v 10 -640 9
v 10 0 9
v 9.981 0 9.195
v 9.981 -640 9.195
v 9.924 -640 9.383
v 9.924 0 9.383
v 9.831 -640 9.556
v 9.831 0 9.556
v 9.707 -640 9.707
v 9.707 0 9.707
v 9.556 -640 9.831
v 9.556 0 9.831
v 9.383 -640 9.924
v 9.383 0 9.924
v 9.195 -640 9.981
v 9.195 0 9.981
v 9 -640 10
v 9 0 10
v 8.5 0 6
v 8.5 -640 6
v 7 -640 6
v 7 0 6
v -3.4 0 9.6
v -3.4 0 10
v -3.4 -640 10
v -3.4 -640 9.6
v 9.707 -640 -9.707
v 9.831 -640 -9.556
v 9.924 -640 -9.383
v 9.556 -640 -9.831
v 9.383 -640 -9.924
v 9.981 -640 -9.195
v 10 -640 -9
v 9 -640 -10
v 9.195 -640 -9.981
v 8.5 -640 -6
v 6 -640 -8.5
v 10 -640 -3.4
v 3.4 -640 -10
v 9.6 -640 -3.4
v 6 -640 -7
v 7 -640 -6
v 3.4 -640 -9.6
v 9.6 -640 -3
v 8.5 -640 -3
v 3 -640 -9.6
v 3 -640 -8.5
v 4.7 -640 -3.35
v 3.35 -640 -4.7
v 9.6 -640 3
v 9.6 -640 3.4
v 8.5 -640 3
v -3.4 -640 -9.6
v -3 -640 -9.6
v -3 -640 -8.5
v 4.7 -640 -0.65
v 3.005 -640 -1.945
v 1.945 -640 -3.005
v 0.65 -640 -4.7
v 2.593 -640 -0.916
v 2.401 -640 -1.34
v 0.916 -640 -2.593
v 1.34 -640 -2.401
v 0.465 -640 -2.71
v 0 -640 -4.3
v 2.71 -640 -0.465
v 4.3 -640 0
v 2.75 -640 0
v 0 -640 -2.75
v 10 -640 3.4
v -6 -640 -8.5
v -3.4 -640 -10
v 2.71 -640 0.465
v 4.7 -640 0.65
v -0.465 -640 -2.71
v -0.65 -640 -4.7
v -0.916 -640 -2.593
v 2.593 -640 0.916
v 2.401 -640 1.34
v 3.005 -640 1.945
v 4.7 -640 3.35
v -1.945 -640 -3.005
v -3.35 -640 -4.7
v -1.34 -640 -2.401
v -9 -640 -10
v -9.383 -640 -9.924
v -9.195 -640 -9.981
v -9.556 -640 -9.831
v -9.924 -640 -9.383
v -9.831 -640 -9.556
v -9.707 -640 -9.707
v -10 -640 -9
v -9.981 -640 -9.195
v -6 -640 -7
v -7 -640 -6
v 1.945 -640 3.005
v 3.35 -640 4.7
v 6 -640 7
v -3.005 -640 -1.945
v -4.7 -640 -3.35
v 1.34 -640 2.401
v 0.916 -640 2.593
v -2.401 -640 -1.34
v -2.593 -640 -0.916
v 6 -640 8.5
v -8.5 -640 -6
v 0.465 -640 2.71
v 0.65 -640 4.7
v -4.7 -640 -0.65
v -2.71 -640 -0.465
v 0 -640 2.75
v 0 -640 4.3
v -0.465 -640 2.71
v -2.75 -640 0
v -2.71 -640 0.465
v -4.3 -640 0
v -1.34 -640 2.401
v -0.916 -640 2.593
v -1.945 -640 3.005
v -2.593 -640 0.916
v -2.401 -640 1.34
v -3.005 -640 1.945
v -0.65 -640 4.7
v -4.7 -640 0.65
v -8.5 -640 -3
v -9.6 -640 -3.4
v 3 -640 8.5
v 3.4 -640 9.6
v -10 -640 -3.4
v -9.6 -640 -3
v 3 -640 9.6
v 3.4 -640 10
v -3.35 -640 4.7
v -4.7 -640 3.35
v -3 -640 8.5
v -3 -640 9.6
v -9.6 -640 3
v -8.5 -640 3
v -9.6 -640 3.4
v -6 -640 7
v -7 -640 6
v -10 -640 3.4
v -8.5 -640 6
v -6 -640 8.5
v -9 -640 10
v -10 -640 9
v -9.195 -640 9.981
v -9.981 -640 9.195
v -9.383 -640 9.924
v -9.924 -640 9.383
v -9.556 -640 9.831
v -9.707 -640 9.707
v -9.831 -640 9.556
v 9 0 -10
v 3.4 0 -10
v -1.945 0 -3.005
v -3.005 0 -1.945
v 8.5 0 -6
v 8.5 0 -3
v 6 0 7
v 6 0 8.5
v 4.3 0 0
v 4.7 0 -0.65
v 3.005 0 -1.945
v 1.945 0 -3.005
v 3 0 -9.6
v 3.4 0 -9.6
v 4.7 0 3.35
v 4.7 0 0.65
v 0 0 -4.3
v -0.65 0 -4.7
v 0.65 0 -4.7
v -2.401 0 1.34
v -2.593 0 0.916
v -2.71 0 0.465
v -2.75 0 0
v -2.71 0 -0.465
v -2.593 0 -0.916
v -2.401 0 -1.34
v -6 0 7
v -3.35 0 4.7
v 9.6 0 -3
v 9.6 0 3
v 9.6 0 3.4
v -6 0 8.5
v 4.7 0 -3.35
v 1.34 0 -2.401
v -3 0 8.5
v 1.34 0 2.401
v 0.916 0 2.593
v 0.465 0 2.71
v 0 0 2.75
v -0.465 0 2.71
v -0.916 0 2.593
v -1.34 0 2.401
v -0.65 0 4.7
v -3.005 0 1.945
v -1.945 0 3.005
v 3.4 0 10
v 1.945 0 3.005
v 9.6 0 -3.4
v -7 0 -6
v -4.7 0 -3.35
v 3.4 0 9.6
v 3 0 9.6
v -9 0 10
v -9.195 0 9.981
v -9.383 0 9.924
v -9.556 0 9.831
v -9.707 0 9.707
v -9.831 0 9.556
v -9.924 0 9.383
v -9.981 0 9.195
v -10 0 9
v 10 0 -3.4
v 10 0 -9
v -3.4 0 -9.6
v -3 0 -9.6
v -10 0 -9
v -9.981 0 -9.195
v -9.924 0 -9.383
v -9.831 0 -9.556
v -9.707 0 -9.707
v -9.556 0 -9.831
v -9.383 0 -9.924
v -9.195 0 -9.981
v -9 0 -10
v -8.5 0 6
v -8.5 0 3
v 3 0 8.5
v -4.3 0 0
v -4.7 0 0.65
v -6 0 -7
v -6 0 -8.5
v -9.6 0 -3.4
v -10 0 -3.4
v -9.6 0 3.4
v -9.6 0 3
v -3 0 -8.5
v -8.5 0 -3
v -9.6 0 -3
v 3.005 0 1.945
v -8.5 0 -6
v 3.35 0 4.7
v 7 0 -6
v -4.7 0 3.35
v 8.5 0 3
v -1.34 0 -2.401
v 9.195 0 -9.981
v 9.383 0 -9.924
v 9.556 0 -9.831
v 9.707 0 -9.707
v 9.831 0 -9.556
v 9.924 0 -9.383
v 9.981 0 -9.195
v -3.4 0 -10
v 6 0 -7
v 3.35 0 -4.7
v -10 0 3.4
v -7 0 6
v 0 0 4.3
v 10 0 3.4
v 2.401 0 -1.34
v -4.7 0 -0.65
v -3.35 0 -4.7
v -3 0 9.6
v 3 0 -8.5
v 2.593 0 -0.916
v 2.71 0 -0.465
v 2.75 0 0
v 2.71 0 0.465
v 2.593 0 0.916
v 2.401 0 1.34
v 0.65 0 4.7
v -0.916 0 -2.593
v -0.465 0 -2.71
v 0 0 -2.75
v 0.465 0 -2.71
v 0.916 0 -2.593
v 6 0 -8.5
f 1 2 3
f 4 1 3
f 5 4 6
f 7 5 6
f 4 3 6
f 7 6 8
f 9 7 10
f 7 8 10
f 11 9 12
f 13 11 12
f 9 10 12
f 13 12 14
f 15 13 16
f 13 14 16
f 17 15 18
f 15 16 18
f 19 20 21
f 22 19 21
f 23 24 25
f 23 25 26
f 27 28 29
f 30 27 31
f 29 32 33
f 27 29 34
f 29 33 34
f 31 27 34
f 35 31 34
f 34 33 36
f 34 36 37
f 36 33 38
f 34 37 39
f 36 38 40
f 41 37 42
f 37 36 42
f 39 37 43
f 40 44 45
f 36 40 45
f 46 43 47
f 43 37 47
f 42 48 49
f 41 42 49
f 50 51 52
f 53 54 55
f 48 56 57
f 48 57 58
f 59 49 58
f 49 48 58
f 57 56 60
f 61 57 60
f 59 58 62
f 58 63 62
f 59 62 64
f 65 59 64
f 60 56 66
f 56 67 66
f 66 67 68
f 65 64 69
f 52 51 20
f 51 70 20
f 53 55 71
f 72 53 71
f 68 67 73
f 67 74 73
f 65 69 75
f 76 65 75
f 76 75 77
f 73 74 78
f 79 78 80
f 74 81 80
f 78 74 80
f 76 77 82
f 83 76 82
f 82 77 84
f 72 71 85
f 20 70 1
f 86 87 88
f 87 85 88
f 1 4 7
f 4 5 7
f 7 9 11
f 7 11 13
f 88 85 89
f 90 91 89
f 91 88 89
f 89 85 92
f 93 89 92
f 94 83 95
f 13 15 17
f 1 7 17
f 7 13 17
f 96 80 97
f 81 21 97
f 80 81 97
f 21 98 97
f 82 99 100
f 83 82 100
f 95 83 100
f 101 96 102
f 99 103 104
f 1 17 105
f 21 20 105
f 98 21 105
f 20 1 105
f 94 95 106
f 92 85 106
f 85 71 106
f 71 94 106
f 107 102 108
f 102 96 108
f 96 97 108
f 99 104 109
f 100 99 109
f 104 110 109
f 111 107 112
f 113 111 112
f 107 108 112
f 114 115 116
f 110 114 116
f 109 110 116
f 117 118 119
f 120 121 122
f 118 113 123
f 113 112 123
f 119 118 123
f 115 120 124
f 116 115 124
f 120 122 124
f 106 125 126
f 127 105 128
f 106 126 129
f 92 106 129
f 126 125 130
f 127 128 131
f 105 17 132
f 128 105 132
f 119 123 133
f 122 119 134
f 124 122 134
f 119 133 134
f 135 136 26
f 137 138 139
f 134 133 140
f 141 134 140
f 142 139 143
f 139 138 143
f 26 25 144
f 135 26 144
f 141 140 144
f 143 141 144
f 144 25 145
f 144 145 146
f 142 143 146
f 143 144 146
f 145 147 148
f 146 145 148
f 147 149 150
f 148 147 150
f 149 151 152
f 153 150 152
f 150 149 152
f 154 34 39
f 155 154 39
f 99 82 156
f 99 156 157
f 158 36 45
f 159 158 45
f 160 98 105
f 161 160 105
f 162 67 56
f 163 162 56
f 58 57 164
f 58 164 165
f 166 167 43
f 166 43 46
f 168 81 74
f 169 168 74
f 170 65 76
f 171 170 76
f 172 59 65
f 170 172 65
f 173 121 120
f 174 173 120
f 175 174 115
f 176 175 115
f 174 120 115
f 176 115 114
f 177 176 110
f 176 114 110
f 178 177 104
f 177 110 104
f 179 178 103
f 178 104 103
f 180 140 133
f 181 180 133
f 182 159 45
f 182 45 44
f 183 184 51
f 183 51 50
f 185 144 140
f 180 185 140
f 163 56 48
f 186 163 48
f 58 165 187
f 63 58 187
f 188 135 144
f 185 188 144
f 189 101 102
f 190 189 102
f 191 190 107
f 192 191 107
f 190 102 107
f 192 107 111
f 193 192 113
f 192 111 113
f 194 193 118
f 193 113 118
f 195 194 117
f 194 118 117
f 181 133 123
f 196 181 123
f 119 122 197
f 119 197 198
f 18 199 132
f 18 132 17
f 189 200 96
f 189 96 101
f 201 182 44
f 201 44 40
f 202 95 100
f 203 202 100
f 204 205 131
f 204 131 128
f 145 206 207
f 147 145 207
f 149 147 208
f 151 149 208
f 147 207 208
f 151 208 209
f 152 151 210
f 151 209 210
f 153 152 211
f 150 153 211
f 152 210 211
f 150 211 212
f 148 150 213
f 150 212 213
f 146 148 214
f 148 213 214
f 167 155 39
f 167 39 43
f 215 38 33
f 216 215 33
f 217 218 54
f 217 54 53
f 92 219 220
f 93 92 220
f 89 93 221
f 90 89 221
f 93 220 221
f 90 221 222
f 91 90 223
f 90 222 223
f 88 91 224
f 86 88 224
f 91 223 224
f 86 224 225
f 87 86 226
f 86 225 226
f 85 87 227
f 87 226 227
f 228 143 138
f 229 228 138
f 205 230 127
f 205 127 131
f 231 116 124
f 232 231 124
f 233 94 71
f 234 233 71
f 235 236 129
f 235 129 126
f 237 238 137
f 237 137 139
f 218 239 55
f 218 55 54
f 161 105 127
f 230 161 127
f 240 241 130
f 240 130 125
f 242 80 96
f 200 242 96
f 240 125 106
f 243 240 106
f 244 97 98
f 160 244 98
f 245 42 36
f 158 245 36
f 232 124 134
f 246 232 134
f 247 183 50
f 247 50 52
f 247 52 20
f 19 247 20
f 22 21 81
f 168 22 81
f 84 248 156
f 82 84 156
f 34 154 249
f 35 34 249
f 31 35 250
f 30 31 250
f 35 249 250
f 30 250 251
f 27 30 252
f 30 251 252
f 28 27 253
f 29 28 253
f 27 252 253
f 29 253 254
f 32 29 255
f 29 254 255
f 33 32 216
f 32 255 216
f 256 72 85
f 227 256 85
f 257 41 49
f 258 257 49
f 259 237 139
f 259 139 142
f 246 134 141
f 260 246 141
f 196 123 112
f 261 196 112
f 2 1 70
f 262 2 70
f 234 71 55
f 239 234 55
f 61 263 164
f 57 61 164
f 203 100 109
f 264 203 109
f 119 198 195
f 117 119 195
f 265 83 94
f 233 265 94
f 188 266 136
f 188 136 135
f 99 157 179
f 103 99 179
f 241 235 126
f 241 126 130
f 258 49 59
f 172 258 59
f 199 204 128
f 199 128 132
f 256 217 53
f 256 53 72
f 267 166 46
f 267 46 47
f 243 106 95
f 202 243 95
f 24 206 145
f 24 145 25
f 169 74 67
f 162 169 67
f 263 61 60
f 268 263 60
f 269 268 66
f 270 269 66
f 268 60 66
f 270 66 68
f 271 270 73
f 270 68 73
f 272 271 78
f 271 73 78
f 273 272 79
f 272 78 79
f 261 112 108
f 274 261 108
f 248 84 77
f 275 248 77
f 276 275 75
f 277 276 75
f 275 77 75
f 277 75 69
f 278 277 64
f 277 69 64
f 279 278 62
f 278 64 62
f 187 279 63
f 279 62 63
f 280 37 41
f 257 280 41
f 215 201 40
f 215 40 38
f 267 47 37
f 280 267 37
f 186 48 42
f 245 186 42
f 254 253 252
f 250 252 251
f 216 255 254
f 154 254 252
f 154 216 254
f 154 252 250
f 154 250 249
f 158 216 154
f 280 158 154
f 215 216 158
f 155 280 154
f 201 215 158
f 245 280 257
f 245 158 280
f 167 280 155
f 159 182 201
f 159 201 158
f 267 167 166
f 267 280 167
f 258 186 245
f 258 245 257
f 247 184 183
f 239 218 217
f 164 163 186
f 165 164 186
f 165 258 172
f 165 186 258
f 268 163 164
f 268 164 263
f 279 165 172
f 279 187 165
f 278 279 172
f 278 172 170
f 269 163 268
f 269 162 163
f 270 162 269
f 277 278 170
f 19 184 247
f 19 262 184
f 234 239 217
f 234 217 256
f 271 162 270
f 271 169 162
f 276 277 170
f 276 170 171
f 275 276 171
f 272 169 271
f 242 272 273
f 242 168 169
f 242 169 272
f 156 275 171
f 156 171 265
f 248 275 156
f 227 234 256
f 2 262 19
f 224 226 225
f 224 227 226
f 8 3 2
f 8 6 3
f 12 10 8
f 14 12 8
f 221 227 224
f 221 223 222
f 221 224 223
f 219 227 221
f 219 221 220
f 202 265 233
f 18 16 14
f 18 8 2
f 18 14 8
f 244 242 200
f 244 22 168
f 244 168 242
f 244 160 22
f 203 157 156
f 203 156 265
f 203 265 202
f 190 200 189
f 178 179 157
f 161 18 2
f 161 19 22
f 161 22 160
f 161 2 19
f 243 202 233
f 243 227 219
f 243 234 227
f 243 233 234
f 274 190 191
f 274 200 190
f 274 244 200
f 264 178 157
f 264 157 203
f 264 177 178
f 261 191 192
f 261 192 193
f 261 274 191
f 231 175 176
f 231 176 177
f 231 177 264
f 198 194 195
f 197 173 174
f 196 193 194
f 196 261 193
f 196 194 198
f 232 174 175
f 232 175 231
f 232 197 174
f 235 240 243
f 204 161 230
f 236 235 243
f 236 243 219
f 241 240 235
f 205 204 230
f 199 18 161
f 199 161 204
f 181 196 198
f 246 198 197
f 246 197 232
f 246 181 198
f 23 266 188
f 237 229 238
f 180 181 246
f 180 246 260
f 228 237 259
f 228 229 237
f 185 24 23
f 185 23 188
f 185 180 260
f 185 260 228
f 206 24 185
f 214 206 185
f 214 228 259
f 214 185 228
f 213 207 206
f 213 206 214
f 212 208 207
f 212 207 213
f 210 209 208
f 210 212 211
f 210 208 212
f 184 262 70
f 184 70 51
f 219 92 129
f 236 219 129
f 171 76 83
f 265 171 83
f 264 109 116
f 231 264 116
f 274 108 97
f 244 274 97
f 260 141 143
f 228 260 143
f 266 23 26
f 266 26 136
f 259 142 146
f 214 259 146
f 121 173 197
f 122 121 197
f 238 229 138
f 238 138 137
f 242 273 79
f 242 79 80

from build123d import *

# Parameters (mm, degrees)
PAD_DEPTH          = 640
POCKET_DEPTH       = 640
POLARPATTERN_COUNT = 4
POCKET001_DEPTH    = 640


with BuildPart() as part:
    # Sketch → Pad (new body)
    with BuildSketch(Plane.XZ):
        with BuildLine():
            Line((-9, 10), (9, 10))
            ThreePointArc((10, 9), (9.707107, 9.707107), (9, 10))
            Line((10, 9), (10, -9))
            ThreePointArc((9, -10), (9.707107, -9.707107), (10, -9))
            Line((9, -10), (-9, -10))
            ThreePointArc((-10, -9), (-9.707107, -9.707107), (-9, -10))
            Line((-10, -9), (-10, 9))
            ThreePointArc((-9, 10), (-9.707107, 9.707107), (-10, 9))
        make_face()
    extrude(amount=PAD_DEPTH)

    # Sketch001 (on Face10 of Pad) → Pocket (cut)
    with BuildSketch(Plane.XZ.offset(640)):
        Polygon((-3.4, 10), (-3.4, 9.6), (-3, 9.6), (-3, 8.5), (-6, 8.5), (-6, 7), (-3.35, 4.7), (-0.65, 4.7), (0, 4.3), (0.65, 4.7), (3.35, 4.7), (6, 7), (6, 8.5), (3, 8.5), (3, 9.6), (3.4, 9.6), (3.4, 10), align=None)
    pocket = extrude(amount=-POCKET_DEPTH, mode=Mode.SUBTRACT)

    # PolarPattern: Pocket ×4 about axis
    polarpattern_axis = Axis((0, -640, 0), (0, -1, 0))
    for i in range(1, POLARPATTERN_COUNT):
        add(pocket.rotate(polarpattern_axis, i * 360 / POLARPATTERN_COUNT), mode=Mode.SUBTRACT)

    # Sketch002 (on Face4 of PolarPattern) → Pocket001 (cut)
    with BuildSketch(Plane.XZ.offset(640)):
        with BuildLine():
            ThreePointArc((1.340499, 2.401159), (0, 2.75), (-1.340499, 2.401159))
            Line((-1.944544, 3.005204), (-1.340499, 2.401159))
            Line((-3.005204, 1.944544), (-1.944544, 3.005204))
            Line((-2.401159, 1.340499), (-3.005204, 1.944544))
            ThreePointArc((-2.401159, 1.340499), (-2.75, 0), (-2.401159, -1.340499))
            Line((-3.005204, -1.944544), (-2.401159, -1.340499))
            Line((-1.944544, -3.005204), (-3.005204, -1.944544))
            Line((-1.340499, -2.401159), (-1.944544, -3.005204))
            ThreePointArc((-1.340499, -2.401159), (0, -2.75), (1.340499, -2.401159))
            Line((1.944544, -3.005204), (1.340499, -2.401159))
            Line((3.005204, -1.944544), (1.944544, -3.005204))
            Line((2.401159, -1.340499), (3.005204, -1.944544))
            ThreePointArc((2.401159, -1.340499), (2.75, 0), (2.401159, 1.340499))
            Line((2.401159, 1.340499), (3.005204, 1.944544))
            Line((3.005204, 1.944544), (1.944544, 3.005204))
            Line((1.944544, 3.005204), (1.340499, 2.401159))
        make_face()
    extrude(amount=-POCKET001_DEPTH, mode=Mode.SUBTRACT)


solid = part.part
